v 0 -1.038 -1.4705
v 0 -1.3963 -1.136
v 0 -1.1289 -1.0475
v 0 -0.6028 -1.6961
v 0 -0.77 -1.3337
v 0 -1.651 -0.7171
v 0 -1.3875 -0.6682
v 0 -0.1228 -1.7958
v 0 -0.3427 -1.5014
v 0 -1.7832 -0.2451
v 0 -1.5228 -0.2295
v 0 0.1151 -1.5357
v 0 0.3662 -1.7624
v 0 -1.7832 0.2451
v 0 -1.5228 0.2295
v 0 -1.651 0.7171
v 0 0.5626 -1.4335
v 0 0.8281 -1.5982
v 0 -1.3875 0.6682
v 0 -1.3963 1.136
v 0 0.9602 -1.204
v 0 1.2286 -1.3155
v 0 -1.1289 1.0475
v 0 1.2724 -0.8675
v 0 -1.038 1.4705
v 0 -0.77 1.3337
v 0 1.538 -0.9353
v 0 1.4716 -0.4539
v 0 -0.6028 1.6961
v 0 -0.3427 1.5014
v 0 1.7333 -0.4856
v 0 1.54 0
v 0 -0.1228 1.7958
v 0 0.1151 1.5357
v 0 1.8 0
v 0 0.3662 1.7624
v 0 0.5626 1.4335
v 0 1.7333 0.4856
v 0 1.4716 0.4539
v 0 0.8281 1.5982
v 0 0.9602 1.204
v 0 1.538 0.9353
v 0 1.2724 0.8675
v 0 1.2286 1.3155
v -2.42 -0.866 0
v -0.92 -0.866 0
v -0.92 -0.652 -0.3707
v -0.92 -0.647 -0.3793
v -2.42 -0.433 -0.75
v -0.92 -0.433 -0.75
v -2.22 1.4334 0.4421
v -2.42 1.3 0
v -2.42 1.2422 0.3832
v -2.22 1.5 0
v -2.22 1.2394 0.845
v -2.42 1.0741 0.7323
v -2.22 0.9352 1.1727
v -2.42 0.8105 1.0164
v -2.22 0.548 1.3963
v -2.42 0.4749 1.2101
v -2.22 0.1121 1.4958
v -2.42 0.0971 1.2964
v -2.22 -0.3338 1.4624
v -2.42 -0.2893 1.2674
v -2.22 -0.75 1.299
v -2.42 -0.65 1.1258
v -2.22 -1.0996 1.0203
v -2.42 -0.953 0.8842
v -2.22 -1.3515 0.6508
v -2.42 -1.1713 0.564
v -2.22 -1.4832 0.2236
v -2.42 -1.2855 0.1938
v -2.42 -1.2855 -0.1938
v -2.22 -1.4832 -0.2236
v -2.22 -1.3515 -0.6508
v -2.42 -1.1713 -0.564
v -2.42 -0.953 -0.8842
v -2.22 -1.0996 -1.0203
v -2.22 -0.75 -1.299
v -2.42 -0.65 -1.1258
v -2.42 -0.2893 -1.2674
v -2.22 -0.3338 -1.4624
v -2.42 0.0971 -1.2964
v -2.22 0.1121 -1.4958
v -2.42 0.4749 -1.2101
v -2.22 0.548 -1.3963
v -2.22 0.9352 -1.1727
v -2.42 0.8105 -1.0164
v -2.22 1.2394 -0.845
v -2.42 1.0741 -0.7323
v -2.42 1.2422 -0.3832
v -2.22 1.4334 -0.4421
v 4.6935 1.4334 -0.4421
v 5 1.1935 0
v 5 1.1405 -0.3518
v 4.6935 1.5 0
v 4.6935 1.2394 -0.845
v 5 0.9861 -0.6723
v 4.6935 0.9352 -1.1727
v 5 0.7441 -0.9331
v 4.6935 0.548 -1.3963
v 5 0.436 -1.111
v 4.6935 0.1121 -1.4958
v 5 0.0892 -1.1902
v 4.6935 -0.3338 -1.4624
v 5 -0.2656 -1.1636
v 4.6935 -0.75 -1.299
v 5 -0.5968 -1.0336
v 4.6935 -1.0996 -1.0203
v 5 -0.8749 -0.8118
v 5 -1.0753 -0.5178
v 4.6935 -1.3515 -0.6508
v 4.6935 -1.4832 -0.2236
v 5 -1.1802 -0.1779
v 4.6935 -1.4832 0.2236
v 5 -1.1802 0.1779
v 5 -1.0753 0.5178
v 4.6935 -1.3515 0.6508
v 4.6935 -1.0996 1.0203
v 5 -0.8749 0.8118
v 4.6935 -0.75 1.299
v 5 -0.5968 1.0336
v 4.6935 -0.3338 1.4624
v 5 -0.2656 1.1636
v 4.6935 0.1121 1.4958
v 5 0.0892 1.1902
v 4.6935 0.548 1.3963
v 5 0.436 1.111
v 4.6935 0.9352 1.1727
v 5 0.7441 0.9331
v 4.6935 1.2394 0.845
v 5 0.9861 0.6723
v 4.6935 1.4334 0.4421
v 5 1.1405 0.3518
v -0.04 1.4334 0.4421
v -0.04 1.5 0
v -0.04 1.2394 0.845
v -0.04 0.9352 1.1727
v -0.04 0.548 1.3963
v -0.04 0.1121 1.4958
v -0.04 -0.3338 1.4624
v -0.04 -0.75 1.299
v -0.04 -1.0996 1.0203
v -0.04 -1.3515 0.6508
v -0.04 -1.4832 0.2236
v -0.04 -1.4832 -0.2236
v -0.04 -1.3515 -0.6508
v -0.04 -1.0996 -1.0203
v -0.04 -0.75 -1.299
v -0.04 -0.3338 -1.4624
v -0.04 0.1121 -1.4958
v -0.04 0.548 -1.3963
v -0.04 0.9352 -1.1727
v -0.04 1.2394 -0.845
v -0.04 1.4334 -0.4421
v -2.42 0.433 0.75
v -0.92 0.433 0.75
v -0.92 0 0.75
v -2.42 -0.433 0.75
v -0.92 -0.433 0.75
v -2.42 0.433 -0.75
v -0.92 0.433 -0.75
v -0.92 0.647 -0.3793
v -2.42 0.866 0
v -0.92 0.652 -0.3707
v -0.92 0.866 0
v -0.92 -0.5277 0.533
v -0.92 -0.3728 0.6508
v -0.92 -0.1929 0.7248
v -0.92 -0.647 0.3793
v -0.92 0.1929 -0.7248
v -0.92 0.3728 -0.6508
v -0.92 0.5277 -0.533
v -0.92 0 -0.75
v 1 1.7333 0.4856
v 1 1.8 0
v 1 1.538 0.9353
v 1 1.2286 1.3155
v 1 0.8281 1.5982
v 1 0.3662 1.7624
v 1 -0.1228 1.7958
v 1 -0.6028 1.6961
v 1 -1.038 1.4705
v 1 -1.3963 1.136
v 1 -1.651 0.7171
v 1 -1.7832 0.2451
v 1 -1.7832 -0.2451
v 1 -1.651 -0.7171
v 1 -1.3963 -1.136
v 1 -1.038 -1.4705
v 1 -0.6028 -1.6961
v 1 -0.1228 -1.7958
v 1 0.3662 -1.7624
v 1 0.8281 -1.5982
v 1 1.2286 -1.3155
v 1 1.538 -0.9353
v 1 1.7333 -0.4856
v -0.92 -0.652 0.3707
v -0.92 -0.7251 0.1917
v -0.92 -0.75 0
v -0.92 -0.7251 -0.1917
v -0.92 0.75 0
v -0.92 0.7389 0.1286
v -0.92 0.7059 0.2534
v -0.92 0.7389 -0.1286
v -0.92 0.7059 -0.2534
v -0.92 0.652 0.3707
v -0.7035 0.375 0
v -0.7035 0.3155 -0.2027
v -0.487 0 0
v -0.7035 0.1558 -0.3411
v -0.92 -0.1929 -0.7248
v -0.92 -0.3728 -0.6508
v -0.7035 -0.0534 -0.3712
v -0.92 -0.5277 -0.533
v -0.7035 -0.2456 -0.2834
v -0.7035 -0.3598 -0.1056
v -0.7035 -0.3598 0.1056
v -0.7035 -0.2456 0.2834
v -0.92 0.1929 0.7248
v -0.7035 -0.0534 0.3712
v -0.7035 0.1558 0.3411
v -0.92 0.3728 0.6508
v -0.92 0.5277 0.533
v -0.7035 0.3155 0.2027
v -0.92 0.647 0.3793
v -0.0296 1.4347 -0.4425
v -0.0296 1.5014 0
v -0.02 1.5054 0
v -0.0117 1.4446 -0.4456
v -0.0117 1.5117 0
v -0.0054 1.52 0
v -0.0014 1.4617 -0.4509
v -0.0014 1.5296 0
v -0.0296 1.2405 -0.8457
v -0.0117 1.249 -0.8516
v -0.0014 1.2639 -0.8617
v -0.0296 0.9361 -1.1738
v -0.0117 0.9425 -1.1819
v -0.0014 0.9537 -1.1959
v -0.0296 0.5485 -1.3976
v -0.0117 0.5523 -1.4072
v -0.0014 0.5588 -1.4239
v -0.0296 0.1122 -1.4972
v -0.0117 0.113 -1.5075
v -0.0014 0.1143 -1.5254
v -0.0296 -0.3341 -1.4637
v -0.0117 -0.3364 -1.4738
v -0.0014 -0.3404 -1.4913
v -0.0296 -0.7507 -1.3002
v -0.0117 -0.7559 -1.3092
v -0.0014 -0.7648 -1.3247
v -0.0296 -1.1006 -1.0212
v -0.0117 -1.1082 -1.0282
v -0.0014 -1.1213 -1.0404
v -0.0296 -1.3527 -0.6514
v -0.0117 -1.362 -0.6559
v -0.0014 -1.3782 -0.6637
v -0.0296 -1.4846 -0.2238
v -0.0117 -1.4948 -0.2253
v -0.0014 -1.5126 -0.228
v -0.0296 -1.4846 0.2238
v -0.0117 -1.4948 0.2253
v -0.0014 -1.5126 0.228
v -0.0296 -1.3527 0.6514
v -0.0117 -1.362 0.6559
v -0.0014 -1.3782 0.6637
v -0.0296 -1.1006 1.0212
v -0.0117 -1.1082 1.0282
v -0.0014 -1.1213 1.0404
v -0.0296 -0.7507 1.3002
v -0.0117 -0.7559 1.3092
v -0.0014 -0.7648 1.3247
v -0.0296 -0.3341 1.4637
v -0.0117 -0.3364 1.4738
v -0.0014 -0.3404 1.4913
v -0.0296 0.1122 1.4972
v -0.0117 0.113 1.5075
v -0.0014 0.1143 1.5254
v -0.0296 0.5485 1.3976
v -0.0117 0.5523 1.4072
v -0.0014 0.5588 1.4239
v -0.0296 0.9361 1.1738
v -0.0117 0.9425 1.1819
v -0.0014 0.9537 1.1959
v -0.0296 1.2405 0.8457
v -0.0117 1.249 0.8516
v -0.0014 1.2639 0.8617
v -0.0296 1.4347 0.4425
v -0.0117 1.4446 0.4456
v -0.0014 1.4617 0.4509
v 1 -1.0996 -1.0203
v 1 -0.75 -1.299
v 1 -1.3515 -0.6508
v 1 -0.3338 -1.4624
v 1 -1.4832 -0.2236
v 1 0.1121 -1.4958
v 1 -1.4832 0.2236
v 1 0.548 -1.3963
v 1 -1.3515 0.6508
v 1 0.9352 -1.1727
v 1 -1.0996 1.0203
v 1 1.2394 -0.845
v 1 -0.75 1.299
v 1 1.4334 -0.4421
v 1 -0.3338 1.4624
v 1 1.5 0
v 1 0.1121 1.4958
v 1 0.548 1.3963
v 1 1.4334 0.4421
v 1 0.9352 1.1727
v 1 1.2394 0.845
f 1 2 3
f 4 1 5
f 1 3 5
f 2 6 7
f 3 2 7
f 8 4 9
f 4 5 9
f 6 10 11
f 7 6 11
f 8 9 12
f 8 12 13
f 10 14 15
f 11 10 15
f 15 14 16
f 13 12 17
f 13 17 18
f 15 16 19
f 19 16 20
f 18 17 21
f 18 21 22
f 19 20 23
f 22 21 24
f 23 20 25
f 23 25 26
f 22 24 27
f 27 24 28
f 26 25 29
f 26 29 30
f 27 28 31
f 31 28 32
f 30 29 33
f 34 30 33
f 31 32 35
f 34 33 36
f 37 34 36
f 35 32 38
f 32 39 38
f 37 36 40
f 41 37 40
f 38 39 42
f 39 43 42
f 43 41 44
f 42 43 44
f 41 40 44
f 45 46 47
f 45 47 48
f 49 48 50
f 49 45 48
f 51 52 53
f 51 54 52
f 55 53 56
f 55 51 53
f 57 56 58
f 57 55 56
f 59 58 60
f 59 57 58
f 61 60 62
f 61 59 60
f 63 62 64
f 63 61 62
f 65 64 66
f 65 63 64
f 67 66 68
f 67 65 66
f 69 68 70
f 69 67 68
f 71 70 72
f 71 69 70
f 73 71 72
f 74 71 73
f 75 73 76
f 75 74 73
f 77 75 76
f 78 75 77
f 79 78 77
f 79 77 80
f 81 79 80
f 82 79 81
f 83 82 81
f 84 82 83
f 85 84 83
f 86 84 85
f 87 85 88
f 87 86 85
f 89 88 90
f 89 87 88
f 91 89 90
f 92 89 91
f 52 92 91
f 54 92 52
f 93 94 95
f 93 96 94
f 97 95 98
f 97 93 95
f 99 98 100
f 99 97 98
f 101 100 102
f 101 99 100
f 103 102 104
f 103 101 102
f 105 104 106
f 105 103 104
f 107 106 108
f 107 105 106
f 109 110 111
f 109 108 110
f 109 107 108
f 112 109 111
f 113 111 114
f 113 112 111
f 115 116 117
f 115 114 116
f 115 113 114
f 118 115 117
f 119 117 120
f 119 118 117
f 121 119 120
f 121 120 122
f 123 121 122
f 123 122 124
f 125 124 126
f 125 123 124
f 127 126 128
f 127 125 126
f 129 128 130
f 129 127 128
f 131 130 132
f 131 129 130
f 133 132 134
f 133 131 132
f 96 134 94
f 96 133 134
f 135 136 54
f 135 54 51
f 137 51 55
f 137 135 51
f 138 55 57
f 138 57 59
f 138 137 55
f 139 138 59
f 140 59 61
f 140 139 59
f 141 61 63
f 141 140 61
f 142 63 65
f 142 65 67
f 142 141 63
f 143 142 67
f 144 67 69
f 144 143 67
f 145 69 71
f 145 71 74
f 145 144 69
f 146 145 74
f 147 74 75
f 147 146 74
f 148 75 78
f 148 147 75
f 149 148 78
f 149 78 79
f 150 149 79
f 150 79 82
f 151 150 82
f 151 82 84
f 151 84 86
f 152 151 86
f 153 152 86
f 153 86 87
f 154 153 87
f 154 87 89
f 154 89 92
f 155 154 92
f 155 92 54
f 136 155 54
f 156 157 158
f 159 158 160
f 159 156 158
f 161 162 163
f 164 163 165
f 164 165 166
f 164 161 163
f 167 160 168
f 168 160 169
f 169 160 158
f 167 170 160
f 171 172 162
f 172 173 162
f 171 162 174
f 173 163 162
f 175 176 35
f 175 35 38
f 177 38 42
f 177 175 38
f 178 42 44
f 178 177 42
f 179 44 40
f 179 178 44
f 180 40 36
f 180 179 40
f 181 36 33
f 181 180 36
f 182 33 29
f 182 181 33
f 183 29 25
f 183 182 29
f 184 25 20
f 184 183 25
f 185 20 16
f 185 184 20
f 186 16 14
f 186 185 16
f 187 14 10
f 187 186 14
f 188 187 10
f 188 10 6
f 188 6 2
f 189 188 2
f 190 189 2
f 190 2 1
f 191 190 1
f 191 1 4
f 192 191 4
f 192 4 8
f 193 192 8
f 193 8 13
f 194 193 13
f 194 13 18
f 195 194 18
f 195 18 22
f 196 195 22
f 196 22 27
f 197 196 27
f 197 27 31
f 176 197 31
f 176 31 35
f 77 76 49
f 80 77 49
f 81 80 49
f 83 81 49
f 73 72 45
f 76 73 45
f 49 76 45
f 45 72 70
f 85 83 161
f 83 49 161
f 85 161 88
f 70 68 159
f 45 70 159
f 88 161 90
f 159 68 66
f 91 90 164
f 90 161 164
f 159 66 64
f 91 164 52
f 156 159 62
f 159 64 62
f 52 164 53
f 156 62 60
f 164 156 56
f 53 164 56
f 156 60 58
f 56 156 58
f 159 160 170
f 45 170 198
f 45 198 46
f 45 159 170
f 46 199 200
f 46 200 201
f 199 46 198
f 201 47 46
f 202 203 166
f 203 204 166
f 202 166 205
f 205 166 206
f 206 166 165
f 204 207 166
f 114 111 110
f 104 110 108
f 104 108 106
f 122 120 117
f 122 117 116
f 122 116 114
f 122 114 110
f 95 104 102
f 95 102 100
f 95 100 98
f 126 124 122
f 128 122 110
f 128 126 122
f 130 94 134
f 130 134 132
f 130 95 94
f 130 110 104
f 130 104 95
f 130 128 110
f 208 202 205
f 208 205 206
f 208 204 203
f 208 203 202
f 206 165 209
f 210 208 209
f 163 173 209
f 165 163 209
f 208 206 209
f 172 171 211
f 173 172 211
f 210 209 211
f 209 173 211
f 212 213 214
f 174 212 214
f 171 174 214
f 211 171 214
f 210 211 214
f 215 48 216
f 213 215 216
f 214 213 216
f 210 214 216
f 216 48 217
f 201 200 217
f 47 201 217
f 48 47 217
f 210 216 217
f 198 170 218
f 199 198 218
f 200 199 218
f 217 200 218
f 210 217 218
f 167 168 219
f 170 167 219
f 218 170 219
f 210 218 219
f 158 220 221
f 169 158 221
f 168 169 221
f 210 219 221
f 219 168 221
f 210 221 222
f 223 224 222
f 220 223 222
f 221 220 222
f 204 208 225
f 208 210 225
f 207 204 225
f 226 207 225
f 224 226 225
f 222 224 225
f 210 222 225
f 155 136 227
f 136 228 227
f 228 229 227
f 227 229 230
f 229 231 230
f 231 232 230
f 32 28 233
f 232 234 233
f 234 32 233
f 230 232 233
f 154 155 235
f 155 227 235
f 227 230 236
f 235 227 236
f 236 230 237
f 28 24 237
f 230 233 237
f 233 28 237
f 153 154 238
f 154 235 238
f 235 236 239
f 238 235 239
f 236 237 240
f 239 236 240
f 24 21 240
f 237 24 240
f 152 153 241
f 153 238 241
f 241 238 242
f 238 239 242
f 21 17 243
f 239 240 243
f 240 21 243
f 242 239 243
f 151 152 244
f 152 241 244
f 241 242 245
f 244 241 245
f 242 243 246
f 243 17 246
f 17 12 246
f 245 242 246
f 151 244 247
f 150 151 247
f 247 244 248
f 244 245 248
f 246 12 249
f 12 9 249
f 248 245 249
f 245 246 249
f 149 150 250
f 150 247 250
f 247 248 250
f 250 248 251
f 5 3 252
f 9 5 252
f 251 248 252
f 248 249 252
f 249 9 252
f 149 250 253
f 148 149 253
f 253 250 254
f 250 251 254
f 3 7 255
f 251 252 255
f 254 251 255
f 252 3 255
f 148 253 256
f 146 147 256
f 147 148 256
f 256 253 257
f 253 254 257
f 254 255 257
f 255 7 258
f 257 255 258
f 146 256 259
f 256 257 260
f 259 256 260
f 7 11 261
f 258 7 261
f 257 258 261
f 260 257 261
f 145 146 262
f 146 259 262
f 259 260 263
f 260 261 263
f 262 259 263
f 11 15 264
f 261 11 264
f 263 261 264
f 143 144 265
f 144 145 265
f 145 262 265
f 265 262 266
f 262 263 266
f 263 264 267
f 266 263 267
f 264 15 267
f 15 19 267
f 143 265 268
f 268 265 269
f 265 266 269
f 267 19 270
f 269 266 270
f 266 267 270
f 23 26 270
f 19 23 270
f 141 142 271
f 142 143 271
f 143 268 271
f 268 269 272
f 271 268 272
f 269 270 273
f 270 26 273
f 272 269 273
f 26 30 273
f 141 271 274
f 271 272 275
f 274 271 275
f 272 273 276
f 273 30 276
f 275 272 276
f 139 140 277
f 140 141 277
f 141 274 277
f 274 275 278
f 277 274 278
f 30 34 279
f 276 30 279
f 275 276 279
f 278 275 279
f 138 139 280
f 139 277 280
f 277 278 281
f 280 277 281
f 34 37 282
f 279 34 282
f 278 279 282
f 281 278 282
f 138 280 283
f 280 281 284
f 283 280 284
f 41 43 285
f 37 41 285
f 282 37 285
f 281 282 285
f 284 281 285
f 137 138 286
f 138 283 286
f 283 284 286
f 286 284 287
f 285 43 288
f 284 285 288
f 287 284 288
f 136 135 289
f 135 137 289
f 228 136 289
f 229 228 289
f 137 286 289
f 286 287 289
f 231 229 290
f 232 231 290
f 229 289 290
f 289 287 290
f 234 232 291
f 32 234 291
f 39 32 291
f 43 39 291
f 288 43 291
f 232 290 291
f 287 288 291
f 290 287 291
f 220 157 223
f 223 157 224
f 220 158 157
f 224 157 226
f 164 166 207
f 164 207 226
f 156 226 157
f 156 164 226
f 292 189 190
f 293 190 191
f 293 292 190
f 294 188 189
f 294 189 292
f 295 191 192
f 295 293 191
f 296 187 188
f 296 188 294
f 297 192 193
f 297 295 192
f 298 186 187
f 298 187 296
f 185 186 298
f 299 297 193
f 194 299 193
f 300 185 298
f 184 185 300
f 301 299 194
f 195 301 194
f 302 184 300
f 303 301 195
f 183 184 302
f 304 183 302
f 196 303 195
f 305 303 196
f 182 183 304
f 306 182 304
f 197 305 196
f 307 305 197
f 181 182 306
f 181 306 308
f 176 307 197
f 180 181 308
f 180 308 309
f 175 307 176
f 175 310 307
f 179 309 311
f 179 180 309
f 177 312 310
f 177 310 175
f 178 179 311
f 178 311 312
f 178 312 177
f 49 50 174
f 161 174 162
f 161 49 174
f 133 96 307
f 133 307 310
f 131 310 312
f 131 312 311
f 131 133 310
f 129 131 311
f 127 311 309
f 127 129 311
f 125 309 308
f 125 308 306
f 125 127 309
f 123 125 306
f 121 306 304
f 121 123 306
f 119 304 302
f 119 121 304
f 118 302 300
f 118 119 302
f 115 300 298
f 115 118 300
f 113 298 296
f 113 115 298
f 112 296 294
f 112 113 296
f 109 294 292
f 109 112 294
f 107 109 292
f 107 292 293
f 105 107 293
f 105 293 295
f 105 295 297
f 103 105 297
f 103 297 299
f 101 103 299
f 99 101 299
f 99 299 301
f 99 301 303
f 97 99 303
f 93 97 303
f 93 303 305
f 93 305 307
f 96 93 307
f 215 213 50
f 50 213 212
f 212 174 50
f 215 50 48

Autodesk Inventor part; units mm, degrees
sketch "Sketch_1" plane through (0, 0, 0) normal (0, 0, 1) x (1, 0, 0)
  line L0 (1, 0) -> (-2.42, 0)
  line L1 (-2.42, 0) -> (-2.42, 1.3)
  line L2 (-2.42, 1.3) -> (-2.22, 1.5)
  line L3 (-2.22, 1.5) -> (-0.04, 1.5)
  arc A0 (-0.04, 1.5) -> (0, 1.54) centre (-0.04, 1.54) ccw
  line L4 (0, 1.54) -> (0, 1.8)
  line L5 (0, 1.8) -> (1, 1.8)
  line L6 (1, 1.8) -> (1, 0)
  line L7 (1, 0) -> (-2.42, 0)
revolve "Revolution1" add sketch "Sketch_1" angle 360 about axis through (1, 0, 0) along (1, 0, 0)
sketch "Sketch_5" plane through (0, 0, 0) normal (0, 0, 1) x (1, 0, 0)
  line L0 (5, 0) -> (1, 0)
  line L1 (1, 0) -> (1, 1.5)
  line L2 (1, 1.5) -> (4.6935, 1.5)
  line L3 (4.6935, 1.5) -> (5, 1.1935)
  line L4 (5, 1.1935) -> (5, 0)
  line L5 (5, 0) -> (1, 0)
revolve "Revolution2" add sketch "Sketch_5" angle 360 about axis through (5, 0, 0) along (1, 0, 0)
thread "Thread1" size "M3x0.5" class "6g" standard "ISO Metric profile" length 2.6935
sketch "Sketch_2" plane through (-2.42, 0, 0) normal (1, 0, 0) x (0, 0, -1)
  line L0 (-0.75, -0.433) -> (0, -0.866)
  line L1 (0, -0.866) -> (0.75, -0.433)
  line L2 (0.75, -0.433) -> (0.75, 0.433)
  line L3 (0.75, 0.433) -> (0, 0.866)
  line L4 (0, 0.866) -> (-0.75, 0.433)
  line L5 (-0.75, 0.433) -> (-0.75, -0.433)
extrude "Extrusion1" cut sketch "Sketch_2" along normal blind 1.5
sketch "Sketch_3" plane through (0, 0, 0) normal (0, 0, 1) x (1, 0, 0)
  line L0 (-0.487, 0) -> (-0.92, 0)
  line L1 (-0.92, 0) -> (-0.92, 0.75)
  line L2 (-0.92, 0.75) -> (-0.487, 0)
  line L3 (-0.487, 0) -> (-0.92, 0)
revolve "Revolution3" cut sketch "Sketch_3" angle 360 about axis through (-0.487, 0, 0) along (1, 0, 0)
ref_plane "shaft_to_bearing_XY" through (0, 0, 0) normal (1, 0, 0) x (0, 0, -1)
ref_plane "shaft_to_bearing_YZ" through (0, 0, 0) normal (0, 0, -1) x (0, 1, 0)
ref_plane "shaft_to_bearing_ZX" through (0, 0, 0) normal (0, 1, 0) x (1, 0, 0)
properties part number "NTBG6-4_a"
